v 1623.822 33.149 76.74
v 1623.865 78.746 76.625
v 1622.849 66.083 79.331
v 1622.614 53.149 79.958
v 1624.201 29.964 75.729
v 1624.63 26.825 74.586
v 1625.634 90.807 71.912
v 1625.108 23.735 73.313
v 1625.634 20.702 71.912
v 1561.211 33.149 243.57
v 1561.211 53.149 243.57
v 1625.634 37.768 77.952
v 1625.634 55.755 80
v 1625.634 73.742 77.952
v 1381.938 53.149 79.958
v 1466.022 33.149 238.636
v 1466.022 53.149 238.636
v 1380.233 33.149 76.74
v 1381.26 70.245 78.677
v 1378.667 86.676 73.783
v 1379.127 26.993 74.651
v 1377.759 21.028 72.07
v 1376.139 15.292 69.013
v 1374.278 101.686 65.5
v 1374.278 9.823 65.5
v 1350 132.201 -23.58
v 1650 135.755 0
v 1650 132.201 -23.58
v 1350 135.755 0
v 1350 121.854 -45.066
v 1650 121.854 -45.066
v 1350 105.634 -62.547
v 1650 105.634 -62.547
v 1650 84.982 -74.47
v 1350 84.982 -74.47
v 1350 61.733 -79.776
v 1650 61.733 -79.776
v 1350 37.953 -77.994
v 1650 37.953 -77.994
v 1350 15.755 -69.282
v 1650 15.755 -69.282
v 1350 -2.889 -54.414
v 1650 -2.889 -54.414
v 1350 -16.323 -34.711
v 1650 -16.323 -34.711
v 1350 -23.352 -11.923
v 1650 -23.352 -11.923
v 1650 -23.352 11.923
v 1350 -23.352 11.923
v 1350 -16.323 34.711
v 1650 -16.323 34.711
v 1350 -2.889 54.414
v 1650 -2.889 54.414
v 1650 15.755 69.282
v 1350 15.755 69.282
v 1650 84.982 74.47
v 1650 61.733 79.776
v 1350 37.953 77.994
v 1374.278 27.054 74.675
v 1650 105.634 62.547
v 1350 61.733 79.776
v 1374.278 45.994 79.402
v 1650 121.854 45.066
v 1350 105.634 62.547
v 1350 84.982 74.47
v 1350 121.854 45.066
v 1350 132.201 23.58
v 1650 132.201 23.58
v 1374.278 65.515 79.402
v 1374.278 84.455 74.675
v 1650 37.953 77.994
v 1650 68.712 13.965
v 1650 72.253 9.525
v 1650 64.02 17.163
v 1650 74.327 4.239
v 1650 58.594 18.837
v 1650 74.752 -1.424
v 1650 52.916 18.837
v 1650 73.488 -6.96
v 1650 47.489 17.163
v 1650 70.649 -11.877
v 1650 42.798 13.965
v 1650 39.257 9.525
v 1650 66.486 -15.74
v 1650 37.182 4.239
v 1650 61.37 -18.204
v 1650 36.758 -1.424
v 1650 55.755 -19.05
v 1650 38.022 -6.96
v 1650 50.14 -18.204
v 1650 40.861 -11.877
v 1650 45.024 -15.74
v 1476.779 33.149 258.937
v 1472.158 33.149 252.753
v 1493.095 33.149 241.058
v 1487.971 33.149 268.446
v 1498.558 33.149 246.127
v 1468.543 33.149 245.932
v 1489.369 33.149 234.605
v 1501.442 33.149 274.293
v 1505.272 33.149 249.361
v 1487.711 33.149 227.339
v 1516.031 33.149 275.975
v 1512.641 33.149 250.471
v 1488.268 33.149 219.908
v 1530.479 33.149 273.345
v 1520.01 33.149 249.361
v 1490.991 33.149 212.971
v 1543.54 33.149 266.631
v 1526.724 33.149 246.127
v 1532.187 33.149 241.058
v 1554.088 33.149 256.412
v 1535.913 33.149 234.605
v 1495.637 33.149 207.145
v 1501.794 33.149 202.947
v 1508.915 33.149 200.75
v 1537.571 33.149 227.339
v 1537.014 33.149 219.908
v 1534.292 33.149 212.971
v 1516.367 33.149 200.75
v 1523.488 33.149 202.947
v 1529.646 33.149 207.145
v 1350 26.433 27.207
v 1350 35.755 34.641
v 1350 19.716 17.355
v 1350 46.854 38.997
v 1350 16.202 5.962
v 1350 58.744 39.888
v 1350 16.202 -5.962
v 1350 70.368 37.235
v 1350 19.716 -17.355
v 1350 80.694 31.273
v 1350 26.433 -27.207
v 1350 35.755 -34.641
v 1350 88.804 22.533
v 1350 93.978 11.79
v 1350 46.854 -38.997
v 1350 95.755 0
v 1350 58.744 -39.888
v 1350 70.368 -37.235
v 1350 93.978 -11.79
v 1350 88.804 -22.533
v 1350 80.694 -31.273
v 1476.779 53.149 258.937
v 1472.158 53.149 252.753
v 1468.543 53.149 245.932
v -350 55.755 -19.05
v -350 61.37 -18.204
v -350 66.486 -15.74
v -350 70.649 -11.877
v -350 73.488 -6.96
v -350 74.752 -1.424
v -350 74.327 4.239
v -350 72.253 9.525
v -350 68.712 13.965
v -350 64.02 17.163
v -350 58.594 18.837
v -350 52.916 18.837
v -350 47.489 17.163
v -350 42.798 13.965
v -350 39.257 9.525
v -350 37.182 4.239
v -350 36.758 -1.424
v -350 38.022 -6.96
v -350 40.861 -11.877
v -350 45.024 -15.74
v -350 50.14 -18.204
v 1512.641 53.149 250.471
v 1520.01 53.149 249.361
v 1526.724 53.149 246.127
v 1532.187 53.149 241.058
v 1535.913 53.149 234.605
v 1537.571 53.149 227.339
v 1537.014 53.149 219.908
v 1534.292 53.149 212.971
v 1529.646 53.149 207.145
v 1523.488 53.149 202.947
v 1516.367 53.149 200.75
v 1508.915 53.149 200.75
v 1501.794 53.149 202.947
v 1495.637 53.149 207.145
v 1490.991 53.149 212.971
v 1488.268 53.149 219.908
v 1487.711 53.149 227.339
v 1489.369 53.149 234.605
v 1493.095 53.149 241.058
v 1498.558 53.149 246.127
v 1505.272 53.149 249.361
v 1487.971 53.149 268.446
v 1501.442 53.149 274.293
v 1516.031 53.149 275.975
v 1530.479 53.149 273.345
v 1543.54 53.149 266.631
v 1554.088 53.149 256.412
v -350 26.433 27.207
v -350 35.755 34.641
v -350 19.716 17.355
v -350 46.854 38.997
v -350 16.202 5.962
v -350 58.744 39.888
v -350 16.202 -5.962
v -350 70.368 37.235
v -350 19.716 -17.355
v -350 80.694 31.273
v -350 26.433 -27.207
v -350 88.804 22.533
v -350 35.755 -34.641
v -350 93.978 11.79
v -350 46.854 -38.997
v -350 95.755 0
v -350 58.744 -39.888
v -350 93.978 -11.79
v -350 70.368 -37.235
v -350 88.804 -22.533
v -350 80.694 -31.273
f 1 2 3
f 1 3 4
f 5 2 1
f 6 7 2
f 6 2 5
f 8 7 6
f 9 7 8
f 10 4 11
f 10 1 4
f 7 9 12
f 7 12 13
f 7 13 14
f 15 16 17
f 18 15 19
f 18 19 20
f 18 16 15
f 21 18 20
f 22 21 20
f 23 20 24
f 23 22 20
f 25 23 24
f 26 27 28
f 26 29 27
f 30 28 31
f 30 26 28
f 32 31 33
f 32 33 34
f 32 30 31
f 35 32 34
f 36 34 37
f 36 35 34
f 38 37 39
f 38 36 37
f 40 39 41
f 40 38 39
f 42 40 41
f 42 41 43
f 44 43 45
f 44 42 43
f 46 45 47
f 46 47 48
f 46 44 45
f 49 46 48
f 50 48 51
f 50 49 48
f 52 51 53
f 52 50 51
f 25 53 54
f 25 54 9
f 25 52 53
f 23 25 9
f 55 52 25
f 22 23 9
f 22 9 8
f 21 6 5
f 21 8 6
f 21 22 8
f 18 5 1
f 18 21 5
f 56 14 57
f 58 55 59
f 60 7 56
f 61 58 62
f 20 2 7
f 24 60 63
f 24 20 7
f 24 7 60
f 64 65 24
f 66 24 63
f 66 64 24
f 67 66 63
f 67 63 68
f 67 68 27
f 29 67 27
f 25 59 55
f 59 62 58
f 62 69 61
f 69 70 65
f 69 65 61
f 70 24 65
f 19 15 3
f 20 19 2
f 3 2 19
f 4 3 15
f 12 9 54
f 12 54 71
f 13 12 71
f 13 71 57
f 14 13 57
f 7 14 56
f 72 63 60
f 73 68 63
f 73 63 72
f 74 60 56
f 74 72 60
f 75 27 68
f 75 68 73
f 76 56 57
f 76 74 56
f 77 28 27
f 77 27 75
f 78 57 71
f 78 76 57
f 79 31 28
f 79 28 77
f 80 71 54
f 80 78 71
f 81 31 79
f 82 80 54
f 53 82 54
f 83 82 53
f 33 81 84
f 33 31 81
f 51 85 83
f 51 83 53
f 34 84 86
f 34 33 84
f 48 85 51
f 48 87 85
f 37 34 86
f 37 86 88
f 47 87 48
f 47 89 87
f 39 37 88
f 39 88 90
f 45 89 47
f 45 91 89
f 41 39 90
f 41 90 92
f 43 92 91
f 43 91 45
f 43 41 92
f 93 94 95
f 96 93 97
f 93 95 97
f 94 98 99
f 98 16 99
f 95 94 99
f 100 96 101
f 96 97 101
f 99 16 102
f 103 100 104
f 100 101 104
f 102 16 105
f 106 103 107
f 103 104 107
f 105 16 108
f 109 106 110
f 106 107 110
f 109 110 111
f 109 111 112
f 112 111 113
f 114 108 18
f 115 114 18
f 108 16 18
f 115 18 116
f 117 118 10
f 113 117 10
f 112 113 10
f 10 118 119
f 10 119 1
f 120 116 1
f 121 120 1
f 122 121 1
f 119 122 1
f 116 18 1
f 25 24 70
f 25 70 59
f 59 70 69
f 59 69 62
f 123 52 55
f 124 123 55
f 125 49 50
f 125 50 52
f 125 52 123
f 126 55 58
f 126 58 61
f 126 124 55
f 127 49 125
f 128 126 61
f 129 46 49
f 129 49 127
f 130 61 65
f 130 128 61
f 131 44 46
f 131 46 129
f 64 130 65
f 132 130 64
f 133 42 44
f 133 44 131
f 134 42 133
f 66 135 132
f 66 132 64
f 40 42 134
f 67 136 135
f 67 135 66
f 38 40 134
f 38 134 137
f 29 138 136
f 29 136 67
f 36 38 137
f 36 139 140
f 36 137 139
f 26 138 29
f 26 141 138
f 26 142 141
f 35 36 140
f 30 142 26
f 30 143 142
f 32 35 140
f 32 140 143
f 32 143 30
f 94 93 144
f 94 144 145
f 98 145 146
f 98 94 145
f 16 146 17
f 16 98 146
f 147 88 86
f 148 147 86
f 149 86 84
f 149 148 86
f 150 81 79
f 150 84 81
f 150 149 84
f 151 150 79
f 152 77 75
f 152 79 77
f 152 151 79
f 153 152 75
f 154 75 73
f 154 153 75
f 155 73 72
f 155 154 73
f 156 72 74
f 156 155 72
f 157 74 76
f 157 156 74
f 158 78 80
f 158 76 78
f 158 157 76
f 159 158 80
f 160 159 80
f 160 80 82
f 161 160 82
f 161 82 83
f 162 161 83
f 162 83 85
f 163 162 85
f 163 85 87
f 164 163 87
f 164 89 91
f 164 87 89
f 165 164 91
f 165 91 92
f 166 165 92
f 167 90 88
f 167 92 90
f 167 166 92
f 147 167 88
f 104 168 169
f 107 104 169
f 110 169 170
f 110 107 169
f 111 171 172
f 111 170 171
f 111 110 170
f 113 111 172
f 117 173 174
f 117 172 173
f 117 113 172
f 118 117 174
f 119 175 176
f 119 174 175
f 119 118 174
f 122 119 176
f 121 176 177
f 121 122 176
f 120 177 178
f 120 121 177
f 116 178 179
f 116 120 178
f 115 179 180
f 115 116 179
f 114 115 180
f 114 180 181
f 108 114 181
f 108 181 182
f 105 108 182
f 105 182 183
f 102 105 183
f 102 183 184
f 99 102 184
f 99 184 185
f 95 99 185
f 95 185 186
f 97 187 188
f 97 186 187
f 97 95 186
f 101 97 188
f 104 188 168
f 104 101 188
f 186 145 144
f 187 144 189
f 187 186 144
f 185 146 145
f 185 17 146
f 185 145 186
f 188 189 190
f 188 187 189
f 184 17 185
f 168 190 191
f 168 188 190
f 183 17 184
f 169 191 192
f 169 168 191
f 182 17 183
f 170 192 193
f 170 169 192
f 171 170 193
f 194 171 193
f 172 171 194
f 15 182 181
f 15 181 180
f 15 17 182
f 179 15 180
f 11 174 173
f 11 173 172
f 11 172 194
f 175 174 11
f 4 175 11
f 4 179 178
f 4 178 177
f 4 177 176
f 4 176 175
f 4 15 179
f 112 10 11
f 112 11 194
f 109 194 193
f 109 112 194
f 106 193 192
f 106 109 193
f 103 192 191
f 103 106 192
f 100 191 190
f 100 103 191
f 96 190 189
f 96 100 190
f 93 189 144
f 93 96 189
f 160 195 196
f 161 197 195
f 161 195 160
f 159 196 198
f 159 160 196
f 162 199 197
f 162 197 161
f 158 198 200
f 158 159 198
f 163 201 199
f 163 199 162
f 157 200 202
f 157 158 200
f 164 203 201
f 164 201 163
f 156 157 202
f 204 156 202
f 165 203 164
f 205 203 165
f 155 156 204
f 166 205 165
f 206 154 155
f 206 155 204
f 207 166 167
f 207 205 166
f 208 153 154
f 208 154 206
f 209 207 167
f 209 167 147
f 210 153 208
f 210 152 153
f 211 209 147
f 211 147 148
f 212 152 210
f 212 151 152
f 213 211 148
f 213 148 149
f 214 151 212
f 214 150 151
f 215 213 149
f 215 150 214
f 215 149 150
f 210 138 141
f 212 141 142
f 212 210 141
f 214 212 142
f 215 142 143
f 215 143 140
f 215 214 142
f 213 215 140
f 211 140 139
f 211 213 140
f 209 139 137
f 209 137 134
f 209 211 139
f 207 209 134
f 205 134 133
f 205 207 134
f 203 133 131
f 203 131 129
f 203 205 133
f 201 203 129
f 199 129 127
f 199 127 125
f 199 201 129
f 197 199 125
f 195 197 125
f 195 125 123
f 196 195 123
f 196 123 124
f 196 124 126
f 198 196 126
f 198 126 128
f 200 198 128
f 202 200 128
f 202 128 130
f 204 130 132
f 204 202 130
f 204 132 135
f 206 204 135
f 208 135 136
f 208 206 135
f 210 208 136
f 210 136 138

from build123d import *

# Parameters (mm, degrees)
SKETCH8_W               = 245.440082446
SKETCH8_H               = 20
BOSS_EXTRUDE1_DEPTH     = 400
CUT_EXTRUDE8_DEPTH      = 1704.211489704
CUT_EXTRUDE8_DEPTH_BACK = 1704.211489704
SKETCH9_R               = 25
CUT_EXTRUDE9_DEPTH      = 1679.423730942
CUT_EXTRUDE9_DEPTH_BACK = 1679.423730942
SKETCH10_R              = 19.05


with BuildPart() as part:
    # Sketch2 → Revolve1 (revolve)
    with BuildSketch(Plane.XY, mode=Mode.PRIVATE) as revolve1_sk:
        Polygon((1650, -24.245152355), (1350, -24.245152355), (1350, 15.754847645), (-350, 15.754847645), (-350, 55.754847645), (1650, 55.754847645), align=None)
    revolve(revolve1_sk.sketch.rotate(Axis((1650, 55.754847645, 0), (-1, 0, 0)), 180), axis=Axis((1650, 55.754847645, 0), (-1, 0, 0)))

    # Sketch8 → Boss-Extrude1 (add)
    with BuildSketch(Plane.XY):
        with Locations((1502.581339025, 43.148524262)):
            Rectangle(SKETCH8_W, SKETCH8_H)
    extrude(amount=BOSS_EXTRUDE1_DEPTH)

    # Sketch9 → Cut-Extrude8 (cut, two sides: drawn at the far end of the back side and taken through both)
    with BuildSketch(Plane(origin=(0, 0, 0), x_dir=(1, 0, 0), z_dir=(0, 1, 0)).offset(-CUT_EXTRUDE8_DEPTH_BACK)):
        with BuildLine():
            ThreePointArc((1561.210933041, -243.569878217), (1523.352220911, -275.193400776), (1476.779097647, -258.936911225))
            ThreePointArc((1476.779097647, -258.936911225), (1470.218517898, -249.41265784), (1466.021642395, -238.635884427))
            Line((1466.021642395, -238.635884427), (1374.277655751, -65.500408808))
            Line((1374.277655751, -65.500408808), (1374.277655751, -447.060346657))
            Line((1374.277655751, -447.060346657), (1625.633642708, -447.060346657))
            Line((1625.633642708, -447.060346657), (1625.633642708, -71.911854778))
            Line((1625.633642708, -71.911854778), (1561.210933041, -243.569878217))
        make_face()
        with Locations(Location((1512.641248766, -225.471244951, 0), (0, 0, 270))):
            Circle(SKETCH9_R)
    extrude(amount=CUT_EXTRUDE8_DEPTH + CUT_EXTRUDE8_DEPTH_BACK, mode=Mode.SUBTRACT)

    # Sketch10 → Cut-Extrude9 (cut, two sides: drawn at the far end of the back side and taken through both)
    with BuildSketch(Plane(origin=(0, 0, 0), x_dir=(0, 0, -1), z_dir=(1, 0, 0)).offset(-CUT_EXTRUDE9_DEPTH_BACK)):
        with Locations((0, 55.754847645)):
            Circle(SKETCH10_R)
    extrude(amount=CUT_EXTRUDE9_DEPTH + CUT_EXTRUDE9_DEPTH_BACK, mode=Mode.SUBTRACT)


solid = part.part
